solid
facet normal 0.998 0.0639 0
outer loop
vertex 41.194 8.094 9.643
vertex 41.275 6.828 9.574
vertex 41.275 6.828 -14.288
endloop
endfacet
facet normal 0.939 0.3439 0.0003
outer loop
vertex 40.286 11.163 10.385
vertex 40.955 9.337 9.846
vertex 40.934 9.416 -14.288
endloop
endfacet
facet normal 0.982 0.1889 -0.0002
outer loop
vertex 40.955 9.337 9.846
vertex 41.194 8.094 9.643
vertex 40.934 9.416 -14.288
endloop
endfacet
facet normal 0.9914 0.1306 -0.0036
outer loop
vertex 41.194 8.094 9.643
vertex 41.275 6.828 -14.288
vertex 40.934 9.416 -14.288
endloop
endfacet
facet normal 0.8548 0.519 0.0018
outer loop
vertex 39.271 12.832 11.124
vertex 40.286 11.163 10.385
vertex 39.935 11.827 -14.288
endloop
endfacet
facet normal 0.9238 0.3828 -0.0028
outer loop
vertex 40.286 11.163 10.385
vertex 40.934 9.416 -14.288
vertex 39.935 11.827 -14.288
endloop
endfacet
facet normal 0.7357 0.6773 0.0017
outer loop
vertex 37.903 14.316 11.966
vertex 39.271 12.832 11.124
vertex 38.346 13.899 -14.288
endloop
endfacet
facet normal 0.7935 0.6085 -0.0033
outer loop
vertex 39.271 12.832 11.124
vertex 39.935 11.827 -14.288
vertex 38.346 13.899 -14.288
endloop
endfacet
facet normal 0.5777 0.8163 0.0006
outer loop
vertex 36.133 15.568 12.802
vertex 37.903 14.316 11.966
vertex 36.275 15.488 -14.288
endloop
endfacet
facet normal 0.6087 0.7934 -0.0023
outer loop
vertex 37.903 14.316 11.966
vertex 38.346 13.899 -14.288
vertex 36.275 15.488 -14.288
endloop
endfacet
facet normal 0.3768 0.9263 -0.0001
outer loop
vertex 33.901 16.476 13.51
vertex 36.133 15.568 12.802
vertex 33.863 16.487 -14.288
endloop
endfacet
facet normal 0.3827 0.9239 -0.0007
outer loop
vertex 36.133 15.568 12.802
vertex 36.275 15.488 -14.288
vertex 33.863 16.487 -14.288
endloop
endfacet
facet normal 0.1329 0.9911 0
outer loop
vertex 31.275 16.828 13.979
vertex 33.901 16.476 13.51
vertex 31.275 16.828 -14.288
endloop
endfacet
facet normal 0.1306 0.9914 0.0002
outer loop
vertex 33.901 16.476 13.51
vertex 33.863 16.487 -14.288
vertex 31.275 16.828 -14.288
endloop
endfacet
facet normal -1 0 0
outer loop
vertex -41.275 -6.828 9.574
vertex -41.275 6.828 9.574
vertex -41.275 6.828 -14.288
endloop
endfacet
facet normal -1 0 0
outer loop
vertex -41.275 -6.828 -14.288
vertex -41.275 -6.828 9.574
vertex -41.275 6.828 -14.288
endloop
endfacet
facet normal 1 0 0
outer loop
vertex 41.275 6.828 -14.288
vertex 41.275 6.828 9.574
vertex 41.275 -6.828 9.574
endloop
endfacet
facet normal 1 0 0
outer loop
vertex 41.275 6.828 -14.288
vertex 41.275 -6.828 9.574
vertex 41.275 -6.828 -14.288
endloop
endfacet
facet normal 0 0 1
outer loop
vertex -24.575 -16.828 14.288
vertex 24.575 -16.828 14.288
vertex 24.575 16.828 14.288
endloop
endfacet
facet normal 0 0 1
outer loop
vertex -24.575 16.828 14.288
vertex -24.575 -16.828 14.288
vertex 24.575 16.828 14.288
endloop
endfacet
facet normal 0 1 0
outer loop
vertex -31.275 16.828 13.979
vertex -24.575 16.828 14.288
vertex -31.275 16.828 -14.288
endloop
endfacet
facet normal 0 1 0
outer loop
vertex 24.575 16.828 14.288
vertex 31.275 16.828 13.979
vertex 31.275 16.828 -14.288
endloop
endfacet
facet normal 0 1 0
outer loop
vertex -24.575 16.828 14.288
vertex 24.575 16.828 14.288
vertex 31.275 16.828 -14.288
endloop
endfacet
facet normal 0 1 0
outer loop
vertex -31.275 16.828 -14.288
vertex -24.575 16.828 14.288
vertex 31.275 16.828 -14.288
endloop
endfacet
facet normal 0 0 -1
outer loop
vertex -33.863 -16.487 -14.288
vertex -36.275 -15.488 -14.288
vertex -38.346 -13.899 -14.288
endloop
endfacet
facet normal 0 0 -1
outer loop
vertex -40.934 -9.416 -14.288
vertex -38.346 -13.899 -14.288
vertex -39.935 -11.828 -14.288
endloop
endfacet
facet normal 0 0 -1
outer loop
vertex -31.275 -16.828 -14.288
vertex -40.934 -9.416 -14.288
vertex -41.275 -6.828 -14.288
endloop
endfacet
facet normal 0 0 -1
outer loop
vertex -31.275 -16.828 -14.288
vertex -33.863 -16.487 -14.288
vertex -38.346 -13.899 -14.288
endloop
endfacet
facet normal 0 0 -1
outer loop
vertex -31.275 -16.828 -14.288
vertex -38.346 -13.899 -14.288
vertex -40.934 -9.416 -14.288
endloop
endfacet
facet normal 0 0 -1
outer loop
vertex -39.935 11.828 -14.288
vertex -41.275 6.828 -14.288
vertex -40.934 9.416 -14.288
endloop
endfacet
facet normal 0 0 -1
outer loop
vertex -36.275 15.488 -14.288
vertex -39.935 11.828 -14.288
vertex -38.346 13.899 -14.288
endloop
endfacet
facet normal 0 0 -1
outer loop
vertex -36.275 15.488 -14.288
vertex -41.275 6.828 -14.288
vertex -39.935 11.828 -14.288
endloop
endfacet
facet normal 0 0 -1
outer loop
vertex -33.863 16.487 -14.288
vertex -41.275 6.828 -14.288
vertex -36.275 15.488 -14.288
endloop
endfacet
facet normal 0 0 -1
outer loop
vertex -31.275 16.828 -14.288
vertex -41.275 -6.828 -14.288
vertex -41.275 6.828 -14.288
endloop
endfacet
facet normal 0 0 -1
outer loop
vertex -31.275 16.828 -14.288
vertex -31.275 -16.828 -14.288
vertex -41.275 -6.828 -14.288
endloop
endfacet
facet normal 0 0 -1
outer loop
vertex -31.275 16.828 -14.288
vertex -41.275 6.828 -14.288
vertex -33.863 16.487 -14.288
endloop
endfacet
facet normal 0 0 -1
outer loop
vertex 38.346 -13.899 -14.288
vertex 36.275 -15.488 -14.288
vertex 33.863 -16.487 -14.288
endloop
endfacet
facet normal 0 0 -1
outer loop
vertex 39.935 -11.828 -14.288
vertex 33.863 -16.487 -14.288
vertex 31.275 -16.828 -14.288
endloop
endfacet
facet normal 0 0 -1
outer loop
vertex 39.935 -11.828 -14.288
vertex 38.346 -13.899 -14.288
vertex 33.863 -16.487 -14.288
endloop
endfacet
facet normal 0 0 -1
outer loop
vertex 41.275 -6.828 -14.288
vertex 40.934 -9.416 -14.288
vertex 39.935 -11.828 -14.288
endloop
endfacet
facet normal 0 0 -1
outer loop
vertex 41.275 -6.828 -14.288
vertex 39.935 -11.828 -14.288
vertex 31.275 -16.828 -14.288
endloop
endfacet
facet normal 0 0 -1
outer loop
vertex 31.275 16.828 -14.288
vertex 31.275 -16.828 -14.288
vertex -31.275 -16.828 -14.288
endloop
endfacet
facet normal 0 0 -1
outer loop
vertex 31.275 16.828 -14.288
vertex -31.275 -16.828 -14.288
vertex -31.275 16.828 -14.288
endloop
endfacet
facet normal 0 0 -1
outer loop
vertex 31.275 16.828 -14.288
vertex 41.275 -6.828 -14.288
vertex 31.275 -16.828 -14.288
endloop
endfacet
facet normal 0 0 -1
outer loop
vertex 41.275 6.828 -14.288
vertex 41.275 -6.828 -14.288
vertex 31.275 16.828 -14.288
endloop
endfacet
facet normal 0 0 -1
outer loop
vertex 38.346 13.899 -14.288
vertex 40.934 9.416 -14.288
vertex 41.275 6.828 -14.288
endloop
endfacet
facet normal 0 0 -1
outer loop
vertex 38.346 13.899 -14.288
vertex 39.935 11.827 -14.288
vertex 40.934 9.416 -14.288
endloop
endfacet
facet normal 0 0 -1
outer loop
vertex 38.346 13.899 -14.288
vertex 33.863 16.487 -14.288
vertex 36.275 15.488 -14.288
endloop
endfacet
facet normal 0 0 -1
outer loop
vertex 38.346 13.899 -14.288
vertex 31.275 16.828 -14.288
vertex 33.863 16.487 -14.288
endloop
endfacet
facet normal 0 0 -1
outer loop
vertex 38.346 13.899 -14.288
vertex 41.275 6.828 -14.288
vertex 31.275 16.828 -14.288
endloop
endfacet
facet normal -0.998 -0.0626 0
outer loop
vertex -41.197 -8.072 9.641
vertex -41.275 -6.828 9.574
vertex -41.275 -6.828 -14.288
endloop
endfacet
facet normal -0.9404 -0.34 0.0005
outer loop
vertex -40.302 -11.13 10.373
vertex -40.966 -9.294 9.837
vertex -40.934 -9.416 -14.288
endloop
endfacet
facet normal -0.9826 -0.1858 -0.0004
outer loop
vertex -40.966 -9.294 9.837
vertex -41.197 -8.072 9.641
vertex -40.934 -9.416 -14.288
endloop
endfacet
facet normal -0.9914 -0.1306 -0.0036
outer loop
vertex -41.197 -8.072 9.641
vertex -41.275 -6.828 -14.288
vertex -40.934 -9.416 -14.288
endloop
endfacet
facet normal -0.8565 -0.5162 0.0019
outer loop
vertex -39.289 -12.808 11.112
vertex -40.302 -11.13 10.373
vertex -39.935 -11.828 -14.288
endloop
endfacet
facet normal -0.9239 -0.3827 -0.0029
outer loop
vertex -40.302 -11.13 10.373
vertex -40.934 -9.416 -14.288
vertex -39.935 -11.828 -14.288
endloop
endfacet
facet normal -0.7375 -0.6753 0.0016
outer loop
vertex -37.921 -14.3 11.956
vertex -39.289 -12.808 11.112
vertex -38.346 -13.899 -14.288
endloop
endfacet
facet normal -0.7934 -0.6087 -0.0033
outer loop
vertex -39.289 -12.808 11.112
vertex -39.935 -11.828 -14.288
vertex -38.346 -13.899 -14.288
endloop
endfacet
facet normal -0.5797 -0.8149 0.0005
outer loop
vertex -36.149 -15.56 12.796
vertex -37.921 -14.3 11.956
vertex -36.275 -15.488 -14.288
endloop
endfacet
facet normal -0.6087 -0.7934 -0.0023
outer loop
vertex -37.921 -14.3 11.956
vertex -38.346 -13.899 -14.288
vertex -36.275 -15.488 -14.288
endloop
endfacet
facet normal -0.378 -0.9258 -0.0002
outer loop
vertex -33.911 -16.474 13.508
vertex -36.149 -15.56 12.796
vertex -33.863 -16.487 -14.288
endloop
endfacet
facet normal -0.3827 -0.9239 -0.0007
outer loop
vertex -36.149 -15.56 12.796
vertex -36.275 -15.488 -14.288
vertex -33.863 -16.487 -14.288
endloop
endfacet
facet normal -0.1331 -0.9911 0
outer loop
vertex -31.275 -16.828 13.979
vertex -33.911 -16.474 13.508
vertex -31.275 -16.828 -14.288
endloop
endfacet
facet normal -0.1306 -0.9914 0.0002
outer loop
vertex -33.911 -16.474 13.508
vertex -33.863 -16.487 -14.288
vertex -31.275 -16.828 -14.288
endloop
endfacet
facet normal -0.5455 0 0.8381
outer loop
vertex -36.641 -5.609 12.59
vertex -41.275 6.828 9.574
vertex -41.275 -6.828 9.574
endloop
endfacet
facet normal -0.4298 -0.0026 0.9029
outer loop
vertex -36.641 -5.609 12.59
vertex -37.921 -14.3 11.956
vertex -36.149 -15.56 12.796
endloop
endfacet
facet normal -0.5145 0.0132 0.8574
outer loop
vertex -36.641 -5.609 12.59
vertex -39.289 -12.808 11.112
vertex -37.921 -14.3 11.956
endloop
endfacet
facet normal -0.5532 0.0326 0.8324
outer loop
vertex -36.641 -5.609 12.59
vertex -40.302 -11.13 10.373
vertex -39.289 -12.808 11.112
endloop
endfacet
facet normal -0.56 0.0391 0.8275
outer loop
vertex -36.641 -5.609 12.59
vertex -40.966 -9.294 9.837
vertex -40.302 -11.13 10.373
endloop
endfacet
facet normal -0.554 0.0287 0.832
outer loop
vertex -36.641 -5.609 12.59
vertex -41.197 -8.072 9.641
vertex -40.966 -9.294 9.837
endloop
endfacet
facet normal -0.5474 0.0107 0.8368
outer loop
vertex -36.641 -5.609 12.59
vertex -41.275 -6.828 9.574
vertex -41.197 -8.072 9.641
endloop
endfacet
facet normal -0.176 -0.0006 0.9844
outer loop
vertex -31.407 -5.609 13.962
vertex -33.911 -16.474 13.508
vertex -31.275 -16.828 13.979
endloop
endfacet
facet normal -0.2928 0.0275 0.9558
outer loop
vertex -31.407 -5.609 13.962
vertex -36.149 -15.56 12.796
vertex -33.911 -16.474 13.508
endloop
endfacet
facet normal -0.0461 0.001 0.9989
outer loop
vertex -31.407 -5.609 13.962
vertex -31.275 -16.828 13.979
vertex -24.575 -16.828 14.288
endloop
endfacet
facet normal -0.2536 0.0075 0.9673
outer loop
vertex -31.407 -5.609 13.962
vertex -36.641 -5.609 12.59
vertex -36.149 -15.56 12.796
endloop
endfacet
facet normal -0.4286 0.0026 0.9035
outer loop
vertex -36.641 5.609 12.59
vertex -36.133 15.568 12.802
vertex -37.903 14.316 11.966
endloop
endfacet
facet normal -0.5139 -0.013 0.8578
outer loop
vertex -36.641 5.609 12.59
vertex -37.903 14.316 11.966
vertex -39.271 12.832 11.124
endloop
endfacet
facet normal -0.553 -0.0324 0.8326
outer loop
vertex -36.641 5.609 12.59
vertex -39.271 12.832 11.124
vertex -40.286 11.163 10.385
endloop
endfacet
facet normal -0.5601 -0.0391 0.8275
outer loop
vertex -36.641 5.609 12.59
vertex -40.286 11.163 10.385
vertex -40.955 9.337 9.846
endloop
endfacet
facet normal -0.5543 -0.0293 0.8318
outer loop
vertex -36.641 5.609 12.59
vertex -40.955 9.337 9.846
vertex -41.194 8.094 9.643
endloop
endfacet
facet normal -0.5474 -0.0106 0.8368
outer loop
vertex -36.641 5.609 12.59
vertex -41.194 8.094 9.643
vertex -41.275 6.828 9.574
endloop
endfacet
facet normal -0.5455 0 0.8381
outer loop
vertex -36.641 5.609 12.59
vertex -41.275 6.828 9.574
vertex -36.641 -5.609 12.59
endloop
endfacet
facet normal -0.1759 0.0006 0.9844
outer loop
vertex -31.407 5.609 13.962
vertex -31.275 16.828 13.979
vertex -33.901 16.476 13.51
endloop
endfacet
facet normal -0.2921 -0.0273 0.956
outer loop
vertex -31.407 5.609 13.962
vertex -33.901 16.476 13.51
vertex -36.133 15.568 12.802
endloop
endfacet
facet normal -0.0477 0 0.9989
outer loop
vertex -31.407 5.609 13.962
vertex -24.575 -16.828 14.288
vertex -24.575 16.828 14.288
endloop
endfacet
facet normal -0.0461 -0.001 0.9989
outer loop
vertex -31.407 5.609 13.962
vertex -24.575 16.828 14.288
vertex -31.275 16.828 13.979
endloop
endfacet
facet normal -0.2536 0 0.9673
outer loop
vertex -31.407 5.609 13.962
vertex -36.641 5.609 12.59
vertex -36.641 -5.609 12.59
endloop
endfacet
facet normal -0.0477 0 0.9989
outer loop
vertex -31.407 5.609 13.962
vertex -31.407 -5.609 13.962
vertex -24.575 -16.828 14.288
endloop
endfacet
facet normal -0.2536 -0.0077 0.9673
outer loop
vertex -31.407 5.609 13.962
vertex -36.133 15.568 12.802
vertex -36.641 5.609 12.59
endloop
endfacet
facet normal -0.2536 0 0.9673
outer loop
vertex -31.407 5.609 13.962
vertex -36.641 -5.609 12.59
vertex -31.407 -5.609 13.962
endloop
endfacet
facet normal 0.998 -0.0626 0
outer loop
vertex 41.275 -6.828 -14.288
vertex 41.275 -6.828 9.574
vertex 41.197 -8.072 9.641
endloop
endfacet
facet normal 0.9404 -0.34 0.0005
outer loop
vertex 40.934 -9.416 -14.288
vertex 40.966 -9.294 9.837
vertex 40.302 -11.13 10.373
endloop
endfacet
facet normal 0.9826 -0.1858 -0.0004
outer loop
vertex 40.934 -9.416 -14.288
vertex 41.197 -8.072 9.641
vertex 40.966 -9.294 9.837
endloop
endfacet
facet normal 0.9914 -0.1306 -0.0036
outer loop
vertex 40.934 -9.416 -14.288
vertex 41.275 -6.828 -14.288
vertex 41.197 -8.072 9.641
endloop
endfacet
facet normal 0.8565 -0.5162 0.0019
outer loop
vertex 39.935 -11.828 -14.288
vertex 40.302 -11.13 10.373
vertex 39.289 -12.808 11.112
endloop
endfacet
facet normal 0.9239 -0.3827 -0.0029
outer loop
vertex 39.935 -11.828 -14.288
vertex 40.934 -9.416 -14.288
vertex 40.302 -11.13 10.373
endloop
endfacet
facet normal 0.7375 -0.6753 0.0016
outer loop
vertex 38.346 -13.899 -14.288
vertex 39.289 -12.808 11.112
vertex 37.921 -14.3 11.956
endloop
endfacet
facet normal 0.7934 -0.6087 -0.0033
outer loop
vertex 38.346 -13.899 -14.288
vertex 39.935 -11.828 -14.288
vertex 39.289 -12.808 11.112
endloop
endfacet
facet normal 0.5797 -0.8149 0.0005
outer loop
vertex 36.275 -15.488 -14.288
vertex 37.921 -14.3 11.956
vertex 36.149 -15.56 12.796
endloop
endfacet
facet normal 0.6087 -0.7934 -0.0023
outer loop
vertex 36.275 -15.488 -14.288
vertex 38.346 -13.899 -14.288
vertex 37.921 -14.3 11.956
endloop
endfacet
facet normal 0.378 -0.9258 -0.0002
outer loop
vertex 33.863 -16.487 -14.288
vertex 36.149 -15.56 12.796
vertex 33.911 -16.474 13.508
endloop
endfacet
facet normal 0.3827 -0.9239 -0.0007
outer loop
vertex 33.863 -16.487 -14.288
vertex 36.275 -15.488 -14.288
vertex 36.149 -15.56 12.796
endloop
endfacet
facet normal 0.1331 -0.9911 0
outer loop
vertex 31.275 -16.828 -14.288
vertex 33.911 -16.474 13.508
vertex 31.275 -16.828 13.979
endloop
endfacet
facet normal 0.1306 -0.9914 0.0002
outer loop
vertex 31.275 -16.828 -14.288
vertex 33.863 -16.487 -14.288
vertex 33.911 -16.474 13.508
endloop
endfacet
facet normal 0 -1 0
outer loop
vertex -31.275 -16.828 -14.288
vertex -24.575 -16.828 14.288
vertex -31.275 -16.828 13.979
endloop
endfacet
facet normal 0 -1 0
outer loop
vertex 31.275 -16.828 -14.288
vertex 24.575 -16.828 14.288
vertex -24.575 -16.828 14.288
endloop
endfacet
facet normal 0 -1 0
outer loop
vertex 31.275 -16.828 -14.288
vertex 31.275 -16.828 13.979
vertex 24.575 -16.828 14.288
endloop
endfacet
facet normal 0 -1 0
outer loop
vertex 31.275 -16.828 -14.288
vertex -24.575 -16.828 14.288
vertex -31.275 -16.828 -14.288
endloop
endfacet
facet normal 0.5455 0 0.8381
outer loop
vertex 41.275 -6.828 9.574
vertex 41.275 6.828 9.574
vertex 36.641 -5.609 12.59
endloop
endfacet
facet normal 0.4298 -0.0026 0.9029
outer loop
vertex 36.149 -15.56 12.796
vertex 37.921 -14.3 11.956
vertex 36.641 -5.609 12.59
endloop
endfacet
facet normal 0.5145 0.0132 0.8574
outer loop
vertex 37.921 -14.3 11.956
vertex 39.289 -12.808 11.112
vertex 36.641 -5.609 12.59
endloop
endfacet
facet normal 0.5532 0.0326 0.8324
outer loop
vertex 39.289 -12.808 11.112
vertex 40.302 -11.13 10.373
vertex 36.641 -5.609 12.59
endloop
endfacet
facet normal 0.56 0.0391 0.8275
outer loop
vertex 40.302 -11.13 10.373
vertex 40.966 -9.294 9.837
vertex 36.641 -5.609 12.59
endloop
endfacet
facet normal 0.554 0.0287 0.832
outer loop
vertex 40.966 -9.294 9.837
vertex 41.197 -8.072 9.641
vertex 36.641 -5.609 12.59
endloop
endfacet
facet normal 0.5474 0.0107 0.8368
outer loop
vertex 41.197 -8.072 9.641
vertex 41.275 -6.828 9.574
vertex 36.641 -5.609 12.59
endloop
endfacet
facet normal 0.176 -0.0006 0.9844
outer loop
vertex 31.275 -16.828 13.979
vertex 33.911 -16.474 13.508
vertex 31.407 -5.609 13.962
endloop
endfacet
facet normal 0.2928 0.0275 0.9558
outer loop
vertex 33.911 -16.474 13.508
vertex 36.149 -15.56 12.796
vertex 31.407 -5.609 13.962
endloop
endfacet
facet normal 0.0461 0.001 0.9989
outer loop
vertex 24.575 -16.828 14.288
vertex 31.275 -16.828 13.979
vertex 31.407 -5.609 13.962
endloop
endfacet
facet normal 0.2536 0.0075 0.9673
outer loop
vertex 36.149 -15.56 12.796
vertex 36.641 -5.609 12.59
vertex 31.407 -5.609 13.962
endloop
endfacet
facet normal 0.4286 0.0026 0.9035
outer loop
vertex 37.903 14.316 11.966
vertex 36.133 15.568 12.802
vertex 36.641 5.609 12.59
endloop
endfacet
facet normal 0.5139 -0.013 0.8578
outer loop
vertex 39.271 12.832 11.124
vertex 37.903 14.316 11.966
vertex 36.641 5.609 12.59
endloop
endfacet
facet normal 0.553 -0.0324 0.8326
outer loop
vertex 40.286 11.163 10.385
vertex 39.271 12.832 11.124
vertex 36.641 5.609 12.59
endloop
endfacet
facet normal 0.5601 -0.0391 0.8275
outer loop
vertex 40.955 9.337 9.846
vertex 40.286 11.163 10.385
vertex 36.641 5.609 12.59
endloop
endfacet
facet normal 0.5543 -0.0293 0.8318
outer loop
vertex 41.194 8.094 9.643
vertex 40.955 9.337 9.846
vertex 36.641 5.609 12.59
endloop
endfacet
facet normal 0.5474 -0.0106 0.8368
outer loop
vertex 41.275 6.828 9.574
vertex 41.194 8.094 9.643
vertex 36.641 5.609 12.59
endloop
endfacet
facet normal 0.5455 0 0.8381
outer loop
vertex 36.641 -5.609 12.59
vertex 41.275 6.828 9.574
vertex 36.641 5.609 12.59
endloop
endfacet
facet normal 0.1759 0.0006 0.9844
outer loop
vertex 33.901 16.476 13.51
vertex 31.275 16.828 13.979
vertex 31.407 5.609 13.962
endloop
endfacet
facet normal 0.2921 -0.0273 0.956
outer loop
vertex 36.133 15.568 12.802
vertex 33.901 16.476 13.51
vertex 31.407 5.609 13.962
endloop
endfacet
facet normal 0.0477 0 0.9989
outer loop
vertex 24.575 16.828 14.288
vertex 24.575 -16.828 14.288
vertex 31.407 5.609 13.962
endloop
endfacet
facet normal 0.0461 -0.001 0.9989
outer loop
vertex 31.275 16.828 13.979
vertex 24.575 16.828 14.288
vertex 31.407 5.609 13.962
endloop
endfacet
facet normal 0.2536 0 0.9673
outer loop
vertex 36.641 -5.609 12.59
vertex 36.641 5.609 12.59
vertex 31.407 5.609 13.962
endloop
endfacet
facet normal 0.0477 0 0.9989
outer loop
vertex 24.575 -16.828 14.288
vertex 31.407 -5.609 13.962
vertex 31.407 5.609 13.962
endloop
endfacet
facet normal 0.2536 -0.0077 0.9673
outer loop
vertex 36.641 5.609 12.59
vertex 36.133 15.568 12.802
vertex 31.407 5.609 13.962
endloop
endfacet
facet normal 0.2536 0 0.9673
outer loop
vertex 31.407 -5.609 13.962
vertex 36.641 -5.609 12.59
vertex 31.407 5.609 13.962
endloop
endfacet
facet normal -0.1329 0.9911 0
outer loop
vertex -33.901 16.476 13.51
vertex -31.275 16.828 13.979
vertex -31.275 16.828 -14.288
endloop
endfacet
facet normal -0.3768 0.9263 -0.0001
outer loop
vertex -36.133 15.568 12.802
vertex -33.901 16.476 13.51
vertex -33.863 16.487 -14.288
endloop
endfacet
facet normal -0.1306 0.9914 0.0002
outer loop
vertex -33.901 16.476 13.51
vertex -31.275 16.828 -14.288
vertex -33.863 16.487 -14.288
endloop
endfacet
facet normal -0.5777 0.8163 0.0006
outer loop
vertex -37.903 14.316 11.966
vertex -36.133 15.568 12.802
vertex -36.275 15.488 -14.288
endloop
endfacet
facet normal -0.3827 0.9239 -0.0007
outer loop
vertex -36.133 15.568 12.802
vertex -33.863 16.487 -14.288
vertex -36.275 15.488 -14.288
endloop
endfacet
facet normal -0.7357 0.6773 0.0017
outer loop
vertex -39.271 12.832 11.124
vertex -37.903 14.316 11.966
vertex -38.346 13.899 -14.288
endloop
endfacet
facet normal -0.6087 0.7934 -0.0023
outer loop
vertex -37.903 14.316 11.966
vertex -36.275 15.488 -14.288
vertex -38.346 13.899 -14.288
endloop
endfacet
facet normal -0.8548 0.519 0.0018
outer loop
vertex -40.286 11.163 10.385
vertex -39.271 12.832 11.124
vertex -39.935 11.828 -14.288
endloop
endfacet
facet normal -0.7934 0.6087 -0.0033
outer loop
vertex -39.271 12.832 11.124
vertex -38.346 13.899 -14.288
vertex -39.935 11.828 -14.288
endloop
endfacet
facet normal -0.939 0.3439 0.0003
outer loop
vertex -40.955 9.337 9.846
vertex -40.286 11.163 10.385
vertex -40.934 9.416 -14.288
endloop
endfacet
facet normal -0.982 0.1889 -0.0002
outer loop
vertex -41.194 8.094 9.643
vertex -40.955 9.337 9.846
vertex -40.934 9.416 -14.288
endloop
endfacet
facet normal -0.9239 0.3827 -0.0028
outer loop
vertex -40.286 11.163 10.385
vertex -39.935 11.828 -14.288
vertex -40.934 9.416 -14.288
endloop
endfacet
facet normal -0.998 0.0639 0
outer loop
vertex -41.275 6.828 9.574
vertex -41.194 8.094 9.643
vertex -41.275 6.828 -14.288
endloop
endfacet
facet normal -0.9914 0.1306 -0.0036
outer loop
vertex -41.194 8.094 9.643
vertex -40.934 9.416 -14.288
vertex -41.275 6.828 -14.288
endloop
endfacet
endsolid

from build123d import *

# Parameters (mm, degrees)
SKETCH1_W           = 28.575
SKETCH1_H           = 33.655
BOSS_EXTRUDE1_DEPTH = 41.275
FILLET1_R           = 10
CUT_EXTRUDE2_DEPTH  = 56.139979201


with BuildPart() as part:
    # Sketch1 → Boss-Extrude1 (new, symmetric)
    with BuildSketch(Plane(origin=(0, 0, 0), x_dir=(0, 0, -1), z_dir=(1, 0, 0))):
        Rectangle(SKETCH1_W, SKETCH1_H)
    extrude(amount=BOSS_EXTRUDE1_DEPTH, both=True)

    # Fillet1
    fillet1_edges = [part.edges().sort_by_distance(p)[0] for p in [
        (41.275, 16.8275, 0),
        (-41.275, 16.8275, 0),
        (-41.275, -16.8275, 0),
        (41.275, -16.8275, 0),
    ]]
    fillet(fillet1_edges, radius=FILLET1_R)

    # Sketch2 → Cut-Extrude2 (cut, through all)
    with BuildSketch(Plane(origin=(0, 16.8275, 0), x_dir=(1, 0, 0), z_dir=(0, 1, 0))):
        with BuildLine():
            Line((-41.275, -9.573739396), (-47.491413454, -9.573739396))
            Line((-47.491413454, -9.573739396), (-47.491413454, -17.62428107))
            Line((-47.491413454, -17.62428107), (-24.575362808, -17.62428107))
            Line((-24.575362808, -17.62428107), (-24.575362808, -14.2875))
            add(Edge.make_bspline(
                [(-41.275, -9.573739396), (-36.608413477, -13.610536753), (-32.538276189, -14.2875), (-24.575362808, -14.2875)],
                knots=[0, 0, 0, 0, 1, 1, 1, 1], degree=3))
        make_face()
        with BuildLine():
            Line((24.575362808, -17.62428107), (24.575362808, -14.2875))
            add(Edge.make_bspline(
                [(41.275, -9.573739396), (36.608413477, -13.610536753), (32.538276189, -14.2875), (24.575362808, -14.2875)],
                knots=[0, 0, 0, 0, 1, 1, 1, 1], degree=3))
            Line((41.275, -9.573739396), (47.491413454, -9.573739396))
            Line((47.491413454, -9.573739396), (47.491413454, -17.62428107))
            Line((47.491413454, -17.62428107), (24.575362808, -17.62428107))
        make_face()
    extrude(amount=-CUT_EXTRUDE2_DEPTH, mode=Mode.SUBTRACT)


solid = part.part
